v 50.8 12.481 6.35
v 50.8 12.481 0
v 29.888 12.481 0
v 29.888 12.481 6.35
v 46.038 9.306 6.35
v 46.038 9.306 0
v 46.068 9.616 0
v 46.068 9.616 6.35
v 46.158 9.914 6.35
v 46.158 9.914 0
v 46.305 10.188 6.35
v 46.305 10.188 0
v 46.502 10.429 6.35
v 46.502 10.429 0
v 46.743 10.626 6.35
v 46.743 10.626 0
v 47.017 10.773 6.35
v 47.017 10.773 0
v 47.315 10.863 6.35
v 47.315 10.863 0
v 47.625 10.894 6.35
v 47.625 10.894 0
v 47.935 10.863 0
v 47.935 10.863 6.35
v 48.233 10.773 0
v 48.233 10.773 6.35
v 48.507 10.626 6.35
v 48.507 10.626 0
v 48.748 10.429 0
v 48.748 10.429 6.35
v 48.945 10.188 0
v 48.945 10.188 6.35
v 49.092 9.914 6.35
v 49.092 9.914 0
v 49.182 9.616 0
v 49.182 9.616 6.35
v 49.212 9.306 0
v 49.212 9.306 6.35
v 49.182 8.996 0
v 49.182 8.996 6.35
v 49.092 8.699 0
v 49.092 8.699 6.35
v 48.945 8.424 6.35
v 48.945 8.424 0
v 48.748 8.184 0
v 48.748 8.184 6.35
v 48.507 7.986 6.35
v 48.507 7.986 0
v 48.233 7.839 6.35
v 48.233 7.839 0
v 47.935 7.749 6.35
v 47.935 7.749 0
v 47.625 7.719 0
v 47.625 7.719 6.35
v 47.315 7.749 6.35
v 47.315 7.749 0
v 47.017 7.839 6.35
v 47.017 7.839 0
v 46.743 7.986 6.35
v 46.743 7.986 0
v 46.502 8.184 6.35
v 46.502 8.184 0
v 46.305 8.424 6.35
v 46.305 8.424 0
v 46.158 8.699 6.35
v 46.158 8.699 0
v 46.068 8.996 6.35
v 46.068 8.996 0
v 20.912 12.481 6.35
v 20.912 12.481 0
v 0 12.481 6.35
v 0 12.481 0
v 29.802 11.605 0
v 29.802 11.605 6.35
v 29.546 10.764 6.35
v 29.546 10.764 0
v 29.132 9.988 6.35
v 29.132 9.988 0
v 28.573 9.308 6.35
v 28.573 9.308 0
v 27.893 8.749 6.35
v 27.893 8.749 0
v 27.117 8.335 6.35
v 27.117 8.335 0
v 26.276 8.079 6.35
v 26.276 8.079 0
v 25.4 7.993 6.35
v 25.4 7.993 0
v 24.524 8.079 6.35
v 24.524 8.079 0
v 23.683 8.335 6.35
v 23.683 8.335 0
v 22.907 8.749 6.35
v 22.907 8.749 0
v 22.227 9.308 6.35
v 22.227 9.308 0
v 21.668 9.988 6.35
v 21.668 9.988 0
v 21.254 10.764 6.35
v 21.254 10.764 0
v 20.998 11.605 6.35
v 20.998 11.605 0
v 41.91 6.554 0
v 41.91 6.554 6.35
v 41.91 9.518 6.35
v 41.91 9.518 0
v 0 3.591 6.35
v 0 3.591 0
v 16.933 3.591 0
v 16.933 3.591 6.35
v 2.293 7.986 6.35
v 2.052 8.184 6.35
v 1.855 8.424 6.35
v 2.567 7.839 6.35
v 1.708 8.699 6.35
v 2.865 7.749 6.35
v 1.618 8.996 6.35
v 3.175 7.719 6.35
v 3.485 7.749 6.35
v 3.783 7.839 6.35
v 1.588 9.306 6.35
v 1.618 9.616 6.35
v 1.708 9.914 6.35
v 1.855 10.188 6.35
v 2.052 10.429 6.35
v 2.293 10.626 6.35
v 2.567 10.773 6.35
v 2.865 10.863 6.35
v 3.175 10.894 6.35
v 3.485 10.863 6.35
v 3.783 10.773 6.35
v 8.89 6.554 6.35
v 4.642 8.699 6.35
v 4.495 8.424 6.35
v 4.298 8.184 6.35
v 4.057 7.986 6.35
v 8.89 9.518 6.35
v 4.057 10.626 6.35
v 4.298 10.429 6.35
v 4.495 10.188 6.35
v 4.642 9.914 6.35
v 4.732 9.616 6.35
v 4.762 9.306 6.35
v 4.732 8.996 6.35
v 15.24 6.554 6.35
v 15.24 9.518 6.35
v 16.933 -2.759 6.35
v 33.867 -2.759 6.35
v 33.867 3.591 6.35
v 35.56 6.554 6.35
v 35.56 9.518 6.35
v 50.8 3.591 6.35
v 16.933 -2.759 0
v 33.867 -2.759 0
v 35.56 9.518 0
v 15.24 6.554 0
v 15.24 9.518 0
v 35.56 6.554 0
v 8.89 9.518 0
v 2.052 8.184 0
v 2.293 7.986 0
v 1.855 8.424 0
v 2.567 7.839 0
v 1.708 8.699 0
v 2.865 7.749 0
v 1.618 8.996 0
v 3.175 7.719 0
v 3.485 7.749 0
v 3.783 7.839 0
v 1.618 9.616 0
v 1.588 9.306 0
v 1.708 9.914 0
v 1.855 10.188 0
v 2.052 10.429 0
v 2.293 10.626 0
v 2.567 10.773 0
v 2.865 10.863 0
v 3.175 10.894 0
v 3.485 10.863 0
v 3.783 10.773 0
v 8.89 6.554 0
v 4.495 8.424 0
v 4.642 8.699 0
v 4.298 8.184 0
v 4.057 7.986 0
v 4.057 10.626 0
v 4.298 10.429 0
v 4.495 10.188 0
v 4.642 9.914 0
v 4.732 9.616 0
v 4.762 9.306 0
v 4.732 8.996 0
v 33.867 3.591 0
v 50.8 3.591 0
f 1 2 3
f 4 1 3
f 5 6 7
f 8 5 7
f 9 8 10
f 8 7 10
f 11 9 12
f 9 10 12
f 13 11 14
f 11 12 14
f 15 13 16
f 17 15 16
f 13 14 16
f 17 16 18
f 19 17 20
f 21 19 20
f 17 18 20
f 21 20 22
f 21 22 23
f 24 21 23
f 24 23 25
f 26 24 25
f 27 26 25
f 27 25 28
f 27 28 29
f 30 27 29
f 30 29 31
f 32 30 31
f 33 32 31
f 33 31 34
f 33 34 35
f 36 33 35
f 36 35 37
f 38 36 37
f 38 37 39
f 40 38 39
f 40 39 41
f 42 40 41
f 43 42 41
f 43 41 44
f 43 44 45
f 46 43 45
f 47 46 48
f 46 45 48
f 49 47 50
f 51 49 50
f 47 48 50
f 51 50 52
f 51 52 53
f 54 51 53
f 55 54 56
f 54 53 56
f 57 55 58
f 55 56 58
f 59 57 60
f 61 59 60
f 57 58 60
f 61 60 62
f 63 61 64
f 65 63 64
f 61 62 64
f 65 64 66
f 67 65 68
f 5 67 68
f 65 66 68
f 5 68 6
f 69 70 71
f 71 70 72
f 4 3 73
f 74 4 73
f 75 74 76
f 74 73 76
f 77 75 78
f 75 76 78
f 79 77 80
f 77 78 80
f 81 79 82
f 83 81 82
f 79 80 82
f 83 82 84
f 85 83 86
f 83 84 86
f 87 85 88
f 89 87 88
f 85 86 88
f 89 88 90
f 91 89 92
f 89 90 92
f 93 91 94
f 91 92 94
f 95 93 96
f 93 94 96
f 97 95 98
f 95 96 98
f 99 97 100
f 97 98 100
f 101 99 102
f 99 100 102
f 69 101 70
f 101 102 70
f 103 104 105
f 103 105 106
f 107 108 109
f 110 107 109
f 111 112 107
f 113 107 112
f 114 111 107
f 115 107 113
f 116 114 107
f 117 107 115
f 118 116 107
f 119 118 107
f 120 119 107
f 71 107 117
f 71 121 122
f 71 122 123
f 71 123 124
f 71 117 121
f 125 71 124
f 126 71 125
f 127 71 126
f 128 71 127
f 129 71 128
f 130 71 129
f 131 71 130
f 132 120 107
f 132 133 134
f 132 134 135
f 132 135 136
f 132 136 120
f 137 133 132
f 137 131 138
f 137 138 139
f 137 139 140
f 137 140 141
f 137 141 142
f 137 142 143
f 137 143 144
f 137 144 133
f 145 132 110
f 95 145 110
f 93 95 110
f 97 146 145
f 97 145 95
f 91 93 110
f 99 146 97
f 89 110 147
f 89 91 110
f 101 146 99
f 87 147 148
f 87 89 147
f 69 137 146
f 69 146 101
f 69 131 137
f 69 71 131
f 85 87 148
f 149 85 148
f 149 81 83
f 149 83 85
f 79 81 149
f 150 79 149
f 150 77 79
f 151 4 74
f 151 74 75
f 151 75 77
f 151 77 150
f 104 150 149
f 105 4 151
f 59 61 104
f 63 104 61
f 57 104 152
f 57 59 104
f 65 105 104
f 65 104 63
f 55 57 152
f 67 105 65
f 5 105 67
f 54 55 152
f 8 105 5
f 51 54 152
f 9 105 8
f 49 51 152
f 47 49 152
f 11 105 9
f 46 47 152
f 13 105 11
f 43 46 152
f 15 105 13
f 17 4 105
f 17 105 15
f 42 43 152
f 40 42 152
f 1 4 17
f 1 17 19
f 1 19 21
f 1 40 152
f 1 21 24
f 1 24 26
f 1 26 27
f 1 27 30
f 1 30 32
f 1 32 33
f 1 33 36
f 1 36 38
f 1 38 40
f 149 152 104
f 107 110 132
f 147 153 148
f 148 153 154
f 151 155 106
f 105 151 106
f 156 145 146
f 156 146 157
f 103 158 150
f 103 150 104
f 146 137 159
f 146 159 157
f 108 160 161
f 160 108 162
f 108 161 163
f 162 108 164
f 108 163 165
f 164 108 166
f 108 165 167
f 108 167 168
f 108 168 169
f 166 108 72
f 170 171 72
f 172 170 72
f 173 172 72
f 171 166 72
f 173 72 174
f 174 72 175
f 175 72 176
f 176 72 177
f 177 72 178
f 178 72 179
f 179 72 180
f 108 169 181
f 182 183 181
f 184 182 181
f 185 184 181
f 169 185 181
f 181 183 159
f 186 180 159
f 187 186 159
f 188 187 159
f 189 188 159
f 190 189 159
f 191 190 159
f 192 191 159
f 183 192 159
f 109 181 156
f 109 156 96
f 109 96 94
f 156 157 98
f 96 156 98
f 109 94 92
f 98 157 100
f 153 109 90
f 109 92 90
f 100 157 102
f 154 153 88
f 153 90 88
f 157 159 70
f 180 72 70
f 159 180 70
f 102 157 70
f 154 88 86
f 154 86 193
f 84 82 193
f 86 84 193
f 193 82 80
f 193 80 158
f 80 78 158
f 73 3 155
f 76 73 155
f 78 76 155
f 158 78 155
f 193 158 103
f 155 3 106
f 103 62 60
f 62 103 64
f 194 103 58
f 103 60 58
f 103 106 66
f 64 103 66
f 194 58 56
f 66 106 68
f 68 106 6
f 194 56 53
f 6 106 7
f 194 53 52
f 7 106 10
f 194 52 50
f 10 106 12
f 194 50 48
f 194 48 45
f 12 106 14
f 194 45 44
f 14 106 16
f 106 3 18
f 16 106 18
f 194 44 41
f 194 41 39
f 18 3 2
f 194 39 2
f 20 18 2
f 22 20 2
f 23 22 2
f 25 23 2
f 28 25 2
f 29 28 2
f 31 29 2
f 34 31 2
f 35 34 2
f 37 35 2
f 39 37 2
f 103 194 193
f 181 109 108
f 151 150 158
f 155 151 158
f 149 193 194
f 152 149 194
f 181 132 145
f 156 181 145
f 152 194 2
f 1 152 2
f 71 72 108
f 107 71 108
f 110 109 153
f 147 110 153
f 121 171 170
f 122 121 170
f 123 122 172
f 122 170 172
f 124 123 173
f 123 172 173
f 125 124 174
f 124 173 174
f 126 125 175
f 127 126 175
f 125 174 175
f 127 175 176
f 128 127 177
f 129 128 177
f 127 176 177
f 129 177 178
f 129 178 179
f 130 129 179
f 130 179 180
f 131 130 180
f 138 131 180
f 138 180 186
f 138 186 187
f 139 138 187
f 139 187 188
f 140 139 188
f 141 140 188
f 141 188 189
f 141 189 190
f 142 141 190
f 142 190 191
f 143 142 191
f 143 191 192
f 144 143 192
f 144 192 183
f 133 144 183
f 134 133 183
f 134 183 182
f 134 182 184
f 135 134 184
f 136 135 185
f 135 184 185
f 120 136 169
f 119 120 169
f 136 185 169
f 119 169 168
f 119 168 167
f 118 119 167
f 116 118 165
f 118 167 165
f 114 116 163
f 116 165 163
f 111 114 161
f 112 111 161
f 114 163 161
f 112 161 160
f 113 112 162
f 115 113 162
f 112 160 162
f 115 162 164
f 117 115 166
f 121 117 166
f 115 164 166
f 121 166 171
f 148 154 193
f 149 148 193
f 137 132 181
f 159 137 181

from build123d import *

# Parameters (mm, degrees)
BOSS_EXTRUDE1_DEPTH = 6.35
SKETCH2_R           = 1.5875
CUT_EXTRUDE1_DEPTH  = 53.694769397
SKETCH3_R           = 4.48798261
CUT_EXTRUDE2_DEPTH  = 53.694769397
CAVITY1_START       = 6.554367816
CAVITY1_OUTLINE_W   = 6.35
CAVITY1_OUTLINE_H   = 6.35
CAVITY1_DEPTH       = 2.963333333


# Read off the part's stored shape, not the designer's step: Cavity1
with BuildPart() as part:
    # Sketch1 → Boss-Extrude1 (new body)
    with BuildSketch(Plane.XY):
        Polygon((16.933333333, -2.758965517), (33.866666667, -2.758965517), (33.866666667, 3.591034483), (50.8, 3.591034483), (50.8, 12.481034483), (0, 12.481034483), (0, 3.591034483), (16.933333333, 3.591034483), align=None)
    extrude(amount=BOSS_EXTRUDE1_DEPTH)

    # Sketch2 → Cut-Extrude1 (cut, through all)
    with BuildSketch(Plane(origin=(0, 0, 0), x_dir=(-1, 0, 0), z_dir=(0, 0, -1))):
        with Locations((-47.625, 9.306034483)):
            Circle(SKETCH2_R)
        with Locations((-3.175, 9.306034483)):
            Circle(SKETCH2_R)
    extrude(amount=-CUT_EXTRUDE1_DEPTH, mode=Mode.SUBTRACT)

    # Sketch3 → Cut-Extrude2 (cut, through all)
    with BuildSketch(Plane(origin=(0, 0, 0), x_dir=(-1, 0, 0), z_dir=(0, 0, -1))):
        with Locations((-25.4, 12.481034483)):
            Circle(SKETCH3_R)
    extrude(amount=-CUT_EXTRUDE2_DEPTH, mode=Mode.SUBTRACT)

    # Cavity1 outline → Cavity1 (cut)
    with BuildSketch(Plane(origin=(0, 0, 0), x_dir=(1, 0, 0), z_dir=(0, 1, 0)).offset(CAVITY1_START)):
        with Locations((38.735, -3.175)):
            Rectangle(CAVITY1_OUTLINE_W, CAVITY1_OUTLINE_H)
        with Locations((12.065, -3.175)):
            Rectangle(CAVITY1_OUTLINE_W, CAVITY1_OUTLINE_H)
    extrude(amount=CAVITY1_DEPTH, mode=Mode.SUBTRACT)


solid = part.part
